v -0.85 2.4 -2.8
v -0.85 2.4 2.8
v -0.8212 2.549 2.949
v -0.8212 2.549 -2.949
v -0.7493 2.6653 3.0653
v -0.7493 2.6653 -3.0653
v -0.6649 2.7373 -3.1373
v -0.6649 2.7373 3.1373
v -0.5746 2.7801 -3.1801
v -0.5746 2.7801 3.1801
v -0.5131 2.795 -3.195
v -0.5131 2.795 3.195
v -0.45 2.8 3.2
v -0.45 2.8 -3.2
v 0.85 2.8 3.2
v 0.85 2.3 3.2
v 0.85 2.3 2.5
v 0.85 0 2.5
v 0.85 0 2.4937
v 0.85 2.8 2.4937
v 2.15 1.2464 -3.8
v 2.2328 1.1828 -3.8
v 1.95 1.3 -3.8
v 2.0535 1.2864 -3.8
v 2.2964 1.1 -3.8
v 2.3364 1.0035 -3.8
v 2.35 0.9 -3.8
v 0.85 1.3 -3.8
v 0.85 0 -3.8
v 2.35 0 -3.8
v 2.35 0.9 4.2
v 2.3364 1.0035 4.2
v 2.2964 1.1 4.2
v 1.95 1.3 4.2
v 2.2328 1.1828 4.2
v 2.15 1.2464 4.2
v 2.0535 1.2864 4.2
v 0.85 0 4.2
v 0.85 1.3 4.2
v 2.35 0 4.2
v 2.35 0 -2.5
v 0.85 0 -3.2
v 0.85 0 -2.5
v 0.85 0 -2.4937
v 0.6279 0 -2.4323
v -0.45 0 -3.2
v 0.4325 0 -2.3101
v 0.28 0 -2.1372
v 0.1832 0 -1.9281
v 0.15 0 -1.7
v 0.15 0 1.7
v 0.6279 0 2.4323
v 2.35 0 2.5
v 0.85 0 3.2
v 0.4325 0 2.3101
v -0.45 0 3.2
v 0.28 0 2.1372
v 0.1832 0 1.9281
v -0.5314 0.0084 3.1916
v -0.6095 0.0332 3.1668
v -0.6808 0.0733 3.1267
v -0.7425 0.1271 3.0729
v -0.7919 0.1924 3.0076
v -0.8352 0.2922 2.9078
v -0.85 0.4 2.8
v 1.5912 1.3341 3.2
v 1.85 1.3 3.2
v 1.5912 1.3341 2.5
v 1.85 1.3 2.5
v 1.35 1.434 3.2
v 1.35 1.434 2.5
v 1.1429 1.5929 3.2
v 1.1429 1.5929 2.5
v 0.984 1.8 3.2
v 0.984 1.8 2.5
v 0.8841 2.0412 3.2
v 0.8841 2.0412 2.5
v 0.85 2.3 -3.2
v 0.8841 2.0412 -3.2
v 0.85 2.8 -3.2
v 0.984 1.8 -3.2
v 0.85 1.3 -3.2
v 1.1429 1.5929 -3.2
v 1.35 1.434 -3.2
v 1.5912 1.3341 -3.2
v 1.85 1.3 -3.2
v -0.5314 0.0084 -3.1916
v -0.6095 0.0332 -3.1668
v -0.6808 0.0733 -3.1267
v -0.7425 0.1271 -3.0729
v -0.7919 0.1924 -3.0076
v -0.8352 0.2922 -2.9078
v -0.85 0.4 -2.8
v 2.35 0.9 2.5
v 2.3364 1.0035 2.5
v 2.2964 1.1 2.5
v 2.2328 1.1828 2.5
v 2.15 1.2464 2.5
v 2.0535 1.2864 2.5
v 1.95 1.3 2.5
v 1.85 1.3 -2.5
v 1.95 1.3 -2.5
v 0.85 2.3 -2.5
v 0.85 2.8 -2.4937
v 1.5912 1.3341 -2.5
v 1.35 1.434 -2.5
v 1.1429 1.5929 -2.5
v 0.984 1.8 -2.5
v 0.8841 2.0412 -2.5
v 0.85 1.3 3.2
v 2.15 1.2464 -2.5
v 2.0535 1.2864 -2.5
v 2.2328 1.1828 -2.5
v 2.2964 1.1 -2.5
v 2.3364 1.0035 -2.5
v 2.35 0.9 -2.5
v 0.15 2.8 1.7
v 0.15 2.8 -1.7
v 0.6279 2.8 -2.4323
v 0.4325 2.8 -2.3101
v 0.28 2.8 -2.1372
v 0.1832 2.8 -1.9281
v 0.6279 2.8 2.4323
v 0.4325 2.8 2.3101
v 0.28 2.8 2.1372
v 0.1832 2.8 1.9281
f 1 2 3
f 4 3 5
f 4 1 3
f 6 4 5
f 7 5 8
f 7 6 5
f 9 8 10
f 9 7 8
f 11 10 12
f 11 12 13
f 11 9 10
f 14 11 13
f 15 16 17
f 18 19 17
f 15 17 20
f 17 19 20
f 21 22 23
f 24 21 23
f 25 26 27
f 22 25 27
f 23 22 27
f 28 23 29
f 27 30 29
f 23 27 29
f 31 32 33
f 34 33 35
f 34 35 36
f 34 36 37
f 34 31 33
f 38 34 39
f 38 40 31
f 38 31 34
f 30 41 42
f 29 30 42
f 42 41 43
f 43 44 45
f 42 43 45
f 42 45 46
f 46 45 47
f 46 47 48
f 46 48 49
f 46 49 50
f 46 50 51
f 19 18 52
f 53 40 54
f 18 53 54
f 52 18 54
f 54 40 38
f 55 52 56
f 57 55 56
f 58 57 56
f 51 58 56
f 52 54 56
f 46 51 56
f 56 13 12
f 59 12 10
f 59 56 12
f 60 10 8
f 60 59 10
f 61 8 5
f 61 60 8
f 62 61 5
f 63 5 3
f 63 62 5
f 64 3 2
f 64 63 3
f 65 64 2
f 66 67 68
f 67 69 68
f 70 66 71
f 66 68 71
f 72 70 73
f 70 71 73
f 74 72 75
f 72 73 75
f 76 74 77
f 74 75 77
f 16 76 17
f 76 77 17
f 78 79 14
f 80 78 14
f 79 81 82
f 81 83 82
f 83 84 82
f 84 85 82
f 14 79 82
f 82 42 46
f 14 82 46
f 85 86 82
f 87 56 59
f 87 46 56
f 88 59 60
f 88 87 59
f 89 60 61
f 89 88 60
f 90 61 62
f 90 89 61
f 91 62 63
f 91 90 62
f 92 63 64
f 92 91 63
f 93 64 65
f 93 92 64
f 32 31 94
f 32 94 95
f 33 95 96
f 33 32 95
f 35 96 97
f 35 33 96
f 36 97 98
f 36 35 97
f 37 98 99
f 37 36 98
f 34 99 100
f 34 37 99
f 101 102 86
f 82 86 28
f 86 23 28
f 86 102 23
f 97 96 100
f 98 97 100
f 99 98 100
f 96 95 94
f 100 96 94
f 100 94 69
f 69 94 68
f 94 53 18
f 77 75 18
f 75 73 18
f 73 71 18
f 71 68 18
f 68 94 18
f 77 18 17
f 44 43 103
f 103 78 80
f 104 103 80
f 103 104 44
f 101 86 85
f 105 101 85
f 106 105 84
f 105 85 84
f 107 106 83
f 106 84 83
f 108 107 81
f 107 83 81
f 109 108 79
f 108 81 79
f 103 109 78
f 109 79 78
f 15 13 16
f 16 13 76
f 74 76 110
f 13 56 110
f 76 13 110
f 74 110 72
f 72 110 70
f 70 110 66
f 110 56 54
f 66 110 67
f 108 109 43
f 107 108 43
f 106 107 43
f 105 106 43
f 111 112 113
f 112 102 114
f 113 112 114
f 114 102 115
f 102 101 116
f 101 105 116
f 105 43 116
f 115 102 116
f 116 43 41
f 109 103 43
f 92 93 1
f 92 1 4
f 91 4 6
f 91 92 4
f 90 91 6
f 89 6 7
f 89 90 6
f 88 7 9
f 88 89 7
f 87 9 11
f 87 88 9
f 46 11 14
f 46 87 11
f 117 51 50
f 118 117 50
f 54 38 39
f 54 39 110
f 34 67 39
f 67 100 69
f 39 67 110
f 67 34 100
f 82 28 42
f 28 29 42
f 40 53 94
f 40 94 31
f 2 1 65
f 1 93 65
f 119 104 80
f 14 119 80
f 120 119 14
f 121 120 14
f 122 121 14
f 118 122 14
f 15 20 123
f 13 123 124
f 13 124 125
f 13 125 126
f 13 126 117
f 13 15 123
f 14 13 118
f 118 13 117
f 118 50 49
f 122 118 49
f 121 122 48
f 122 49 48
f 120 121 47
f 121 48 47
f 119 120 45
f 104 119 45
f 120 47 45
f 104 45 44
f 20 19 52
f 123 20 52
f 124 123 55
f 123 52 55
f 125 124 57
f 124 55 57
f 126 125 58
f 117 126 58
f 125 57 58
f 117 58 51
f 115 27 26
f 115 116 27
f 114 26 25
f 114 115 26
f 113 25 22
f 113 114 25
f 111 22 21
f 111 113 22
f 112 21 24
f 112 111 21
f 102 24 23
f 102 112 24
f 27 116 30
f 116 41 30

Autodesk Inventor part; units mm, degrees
ref_plane "YZ Plane" through (0, 0, 0) normal (1, 0, 0) x (0, 1, 0)
ref_plane "XZ Plane" through (0, 0, 0) normal (0, 1, 0) x (-1, 0, 0)
ref_plane "XY Plane" through (0, 0, 0) normal (0, 0, 1) x (1, 0, 0)
sketch "Sketch1" plane through (0, 0, 0) normal (0, 1, 0) x (-1, 0, 0)
  line L0 (0.85, 3.2) -> (-0.85, 3.2)
  line L1 (-0.85, 3.2) -> (-0.85, -3.2)
  line L2 (-0.85, -3.2) -> (0.85, -3.2)
  line L3 (0.85, -3.2) -> (0.85, 3.2)
  line L4 (0.85, 3.2) -> (-0.85, -3.2) construction
  line L5 (-0.85, 3.2) -> (0.85, -3.2) construction
  line L6 (-0.85, -1.3) -> (-2.35, -1.3) construction
  line L7 (-2.35, -1.3) -> (-2.35, -3.4525)
  line L8 (-0.85, -3.2) -> (-0.85, -1.3)
  line L9 (-2.35, -3.4525) -> (-2.35, -3.8)
  line L10 (-2.35, -3.8) -> (-0.85, -3.8)
  line L11 (-0.85, -3.8) -> (-0.85, -3.2)
  line L12 (-2.35, -2.5) -> (-0.85, -2.5)
  line L13 (0, 0) -> (-4.1965, 0) construction
  line L14 (-2.35, 1.3) -> (-2.35, 3.4525)
  line L15 (-2.35, 2.5) -> (-0.85, 2.5)
  line L16 (-0.85, 2.5) -> (-2.35, 2.5)
  line L17 (-2.35, 2.5) -> (-2.35, 4.2)
  line L18 (-2.35, 4.2) -> (-0.85, 4.2)
  line L19 (-0.85, 4.2) -> (-0.85, 2.5)
  line L20 (-0.85, 2.5) -> (-0.15, 2.5)
  line L21 (-0.15, 2.5) -> (-0.15, -2.5)
  line L22 (-0.15, -2.5) -> (-0.85, -2.5)
  line L23 (-0.85, -2.5) -> (-0.85, 2.5)
  point P0 (-0.85, 2.5)
  point P1 (-0.85, -2.5)
  point P2 (-2.35, 3.4525)
  dimension "d0" = 1.3
  dimension "d2" = 1.7
  dimension "d3" = 1.5
  dimension "d5" = 1.9
  dimension "d7" = 2.5
  dimension "d13" = 1
  dimension "d14" = 2.5
  dimension "d18" = 0.7
extrude "Extrusion1" add sketch "Sketch1" along normal blind 2.8 contours L3 L2 L1 L22 L21 L20 L0 | L1 L15 L14 L17 L18 L19 | L11 L10 L9 L7 L12 L1
sketch "Sketch2" plane through (0, 0, 0) normal (0, 0, 1) x (1, 0, 0)
  line L0 (0.85, 2.8) -> (2.35, 2.8)
  line L1 (2.35, 2.8) -> (2.35, 1.3)
  line L2 (2.35, 1.3) -> (0.85, 1.3)
  line L3 (0.85, 1.3) -> (0.85, 2.8)
  line L4 (2.35, 0) -> (2.35, 2.8) projected
  line L5 (0.85, 0) -> (0.85, 2.8) projected
  line L6 (0.85, 2.8) -> (2.35, 2.8) projected
  dimension "d15" = 1.5
extrude "Extrusion2" cut sketch "Sketch2" along normal through all both and the other way through all
fillet "Fillet1" radius 0.8 2 edges at (0.15, 1.4, -2.5) (0.15, 1.4, 2.5)
fillet "Fillet1" radius 1 2 edges at (0.85, 1.3, 2.85) (0.85, 1.3, -2.85)
fillet "Fillet1" radius 0.4 2 edges at (2.35, 1.3, 3.35) (2.35, 1.3, -3.15)
fillet "Fillet1" radius 0.4 4 edges at (-0.85, 2.8, 0) (-0.85, 0, 0) (-0.85, 1.4, -3.2) (-0.85, 1.4, 3.2)
equation "\"button_height\" = 1.3"
properties part number "Button"
